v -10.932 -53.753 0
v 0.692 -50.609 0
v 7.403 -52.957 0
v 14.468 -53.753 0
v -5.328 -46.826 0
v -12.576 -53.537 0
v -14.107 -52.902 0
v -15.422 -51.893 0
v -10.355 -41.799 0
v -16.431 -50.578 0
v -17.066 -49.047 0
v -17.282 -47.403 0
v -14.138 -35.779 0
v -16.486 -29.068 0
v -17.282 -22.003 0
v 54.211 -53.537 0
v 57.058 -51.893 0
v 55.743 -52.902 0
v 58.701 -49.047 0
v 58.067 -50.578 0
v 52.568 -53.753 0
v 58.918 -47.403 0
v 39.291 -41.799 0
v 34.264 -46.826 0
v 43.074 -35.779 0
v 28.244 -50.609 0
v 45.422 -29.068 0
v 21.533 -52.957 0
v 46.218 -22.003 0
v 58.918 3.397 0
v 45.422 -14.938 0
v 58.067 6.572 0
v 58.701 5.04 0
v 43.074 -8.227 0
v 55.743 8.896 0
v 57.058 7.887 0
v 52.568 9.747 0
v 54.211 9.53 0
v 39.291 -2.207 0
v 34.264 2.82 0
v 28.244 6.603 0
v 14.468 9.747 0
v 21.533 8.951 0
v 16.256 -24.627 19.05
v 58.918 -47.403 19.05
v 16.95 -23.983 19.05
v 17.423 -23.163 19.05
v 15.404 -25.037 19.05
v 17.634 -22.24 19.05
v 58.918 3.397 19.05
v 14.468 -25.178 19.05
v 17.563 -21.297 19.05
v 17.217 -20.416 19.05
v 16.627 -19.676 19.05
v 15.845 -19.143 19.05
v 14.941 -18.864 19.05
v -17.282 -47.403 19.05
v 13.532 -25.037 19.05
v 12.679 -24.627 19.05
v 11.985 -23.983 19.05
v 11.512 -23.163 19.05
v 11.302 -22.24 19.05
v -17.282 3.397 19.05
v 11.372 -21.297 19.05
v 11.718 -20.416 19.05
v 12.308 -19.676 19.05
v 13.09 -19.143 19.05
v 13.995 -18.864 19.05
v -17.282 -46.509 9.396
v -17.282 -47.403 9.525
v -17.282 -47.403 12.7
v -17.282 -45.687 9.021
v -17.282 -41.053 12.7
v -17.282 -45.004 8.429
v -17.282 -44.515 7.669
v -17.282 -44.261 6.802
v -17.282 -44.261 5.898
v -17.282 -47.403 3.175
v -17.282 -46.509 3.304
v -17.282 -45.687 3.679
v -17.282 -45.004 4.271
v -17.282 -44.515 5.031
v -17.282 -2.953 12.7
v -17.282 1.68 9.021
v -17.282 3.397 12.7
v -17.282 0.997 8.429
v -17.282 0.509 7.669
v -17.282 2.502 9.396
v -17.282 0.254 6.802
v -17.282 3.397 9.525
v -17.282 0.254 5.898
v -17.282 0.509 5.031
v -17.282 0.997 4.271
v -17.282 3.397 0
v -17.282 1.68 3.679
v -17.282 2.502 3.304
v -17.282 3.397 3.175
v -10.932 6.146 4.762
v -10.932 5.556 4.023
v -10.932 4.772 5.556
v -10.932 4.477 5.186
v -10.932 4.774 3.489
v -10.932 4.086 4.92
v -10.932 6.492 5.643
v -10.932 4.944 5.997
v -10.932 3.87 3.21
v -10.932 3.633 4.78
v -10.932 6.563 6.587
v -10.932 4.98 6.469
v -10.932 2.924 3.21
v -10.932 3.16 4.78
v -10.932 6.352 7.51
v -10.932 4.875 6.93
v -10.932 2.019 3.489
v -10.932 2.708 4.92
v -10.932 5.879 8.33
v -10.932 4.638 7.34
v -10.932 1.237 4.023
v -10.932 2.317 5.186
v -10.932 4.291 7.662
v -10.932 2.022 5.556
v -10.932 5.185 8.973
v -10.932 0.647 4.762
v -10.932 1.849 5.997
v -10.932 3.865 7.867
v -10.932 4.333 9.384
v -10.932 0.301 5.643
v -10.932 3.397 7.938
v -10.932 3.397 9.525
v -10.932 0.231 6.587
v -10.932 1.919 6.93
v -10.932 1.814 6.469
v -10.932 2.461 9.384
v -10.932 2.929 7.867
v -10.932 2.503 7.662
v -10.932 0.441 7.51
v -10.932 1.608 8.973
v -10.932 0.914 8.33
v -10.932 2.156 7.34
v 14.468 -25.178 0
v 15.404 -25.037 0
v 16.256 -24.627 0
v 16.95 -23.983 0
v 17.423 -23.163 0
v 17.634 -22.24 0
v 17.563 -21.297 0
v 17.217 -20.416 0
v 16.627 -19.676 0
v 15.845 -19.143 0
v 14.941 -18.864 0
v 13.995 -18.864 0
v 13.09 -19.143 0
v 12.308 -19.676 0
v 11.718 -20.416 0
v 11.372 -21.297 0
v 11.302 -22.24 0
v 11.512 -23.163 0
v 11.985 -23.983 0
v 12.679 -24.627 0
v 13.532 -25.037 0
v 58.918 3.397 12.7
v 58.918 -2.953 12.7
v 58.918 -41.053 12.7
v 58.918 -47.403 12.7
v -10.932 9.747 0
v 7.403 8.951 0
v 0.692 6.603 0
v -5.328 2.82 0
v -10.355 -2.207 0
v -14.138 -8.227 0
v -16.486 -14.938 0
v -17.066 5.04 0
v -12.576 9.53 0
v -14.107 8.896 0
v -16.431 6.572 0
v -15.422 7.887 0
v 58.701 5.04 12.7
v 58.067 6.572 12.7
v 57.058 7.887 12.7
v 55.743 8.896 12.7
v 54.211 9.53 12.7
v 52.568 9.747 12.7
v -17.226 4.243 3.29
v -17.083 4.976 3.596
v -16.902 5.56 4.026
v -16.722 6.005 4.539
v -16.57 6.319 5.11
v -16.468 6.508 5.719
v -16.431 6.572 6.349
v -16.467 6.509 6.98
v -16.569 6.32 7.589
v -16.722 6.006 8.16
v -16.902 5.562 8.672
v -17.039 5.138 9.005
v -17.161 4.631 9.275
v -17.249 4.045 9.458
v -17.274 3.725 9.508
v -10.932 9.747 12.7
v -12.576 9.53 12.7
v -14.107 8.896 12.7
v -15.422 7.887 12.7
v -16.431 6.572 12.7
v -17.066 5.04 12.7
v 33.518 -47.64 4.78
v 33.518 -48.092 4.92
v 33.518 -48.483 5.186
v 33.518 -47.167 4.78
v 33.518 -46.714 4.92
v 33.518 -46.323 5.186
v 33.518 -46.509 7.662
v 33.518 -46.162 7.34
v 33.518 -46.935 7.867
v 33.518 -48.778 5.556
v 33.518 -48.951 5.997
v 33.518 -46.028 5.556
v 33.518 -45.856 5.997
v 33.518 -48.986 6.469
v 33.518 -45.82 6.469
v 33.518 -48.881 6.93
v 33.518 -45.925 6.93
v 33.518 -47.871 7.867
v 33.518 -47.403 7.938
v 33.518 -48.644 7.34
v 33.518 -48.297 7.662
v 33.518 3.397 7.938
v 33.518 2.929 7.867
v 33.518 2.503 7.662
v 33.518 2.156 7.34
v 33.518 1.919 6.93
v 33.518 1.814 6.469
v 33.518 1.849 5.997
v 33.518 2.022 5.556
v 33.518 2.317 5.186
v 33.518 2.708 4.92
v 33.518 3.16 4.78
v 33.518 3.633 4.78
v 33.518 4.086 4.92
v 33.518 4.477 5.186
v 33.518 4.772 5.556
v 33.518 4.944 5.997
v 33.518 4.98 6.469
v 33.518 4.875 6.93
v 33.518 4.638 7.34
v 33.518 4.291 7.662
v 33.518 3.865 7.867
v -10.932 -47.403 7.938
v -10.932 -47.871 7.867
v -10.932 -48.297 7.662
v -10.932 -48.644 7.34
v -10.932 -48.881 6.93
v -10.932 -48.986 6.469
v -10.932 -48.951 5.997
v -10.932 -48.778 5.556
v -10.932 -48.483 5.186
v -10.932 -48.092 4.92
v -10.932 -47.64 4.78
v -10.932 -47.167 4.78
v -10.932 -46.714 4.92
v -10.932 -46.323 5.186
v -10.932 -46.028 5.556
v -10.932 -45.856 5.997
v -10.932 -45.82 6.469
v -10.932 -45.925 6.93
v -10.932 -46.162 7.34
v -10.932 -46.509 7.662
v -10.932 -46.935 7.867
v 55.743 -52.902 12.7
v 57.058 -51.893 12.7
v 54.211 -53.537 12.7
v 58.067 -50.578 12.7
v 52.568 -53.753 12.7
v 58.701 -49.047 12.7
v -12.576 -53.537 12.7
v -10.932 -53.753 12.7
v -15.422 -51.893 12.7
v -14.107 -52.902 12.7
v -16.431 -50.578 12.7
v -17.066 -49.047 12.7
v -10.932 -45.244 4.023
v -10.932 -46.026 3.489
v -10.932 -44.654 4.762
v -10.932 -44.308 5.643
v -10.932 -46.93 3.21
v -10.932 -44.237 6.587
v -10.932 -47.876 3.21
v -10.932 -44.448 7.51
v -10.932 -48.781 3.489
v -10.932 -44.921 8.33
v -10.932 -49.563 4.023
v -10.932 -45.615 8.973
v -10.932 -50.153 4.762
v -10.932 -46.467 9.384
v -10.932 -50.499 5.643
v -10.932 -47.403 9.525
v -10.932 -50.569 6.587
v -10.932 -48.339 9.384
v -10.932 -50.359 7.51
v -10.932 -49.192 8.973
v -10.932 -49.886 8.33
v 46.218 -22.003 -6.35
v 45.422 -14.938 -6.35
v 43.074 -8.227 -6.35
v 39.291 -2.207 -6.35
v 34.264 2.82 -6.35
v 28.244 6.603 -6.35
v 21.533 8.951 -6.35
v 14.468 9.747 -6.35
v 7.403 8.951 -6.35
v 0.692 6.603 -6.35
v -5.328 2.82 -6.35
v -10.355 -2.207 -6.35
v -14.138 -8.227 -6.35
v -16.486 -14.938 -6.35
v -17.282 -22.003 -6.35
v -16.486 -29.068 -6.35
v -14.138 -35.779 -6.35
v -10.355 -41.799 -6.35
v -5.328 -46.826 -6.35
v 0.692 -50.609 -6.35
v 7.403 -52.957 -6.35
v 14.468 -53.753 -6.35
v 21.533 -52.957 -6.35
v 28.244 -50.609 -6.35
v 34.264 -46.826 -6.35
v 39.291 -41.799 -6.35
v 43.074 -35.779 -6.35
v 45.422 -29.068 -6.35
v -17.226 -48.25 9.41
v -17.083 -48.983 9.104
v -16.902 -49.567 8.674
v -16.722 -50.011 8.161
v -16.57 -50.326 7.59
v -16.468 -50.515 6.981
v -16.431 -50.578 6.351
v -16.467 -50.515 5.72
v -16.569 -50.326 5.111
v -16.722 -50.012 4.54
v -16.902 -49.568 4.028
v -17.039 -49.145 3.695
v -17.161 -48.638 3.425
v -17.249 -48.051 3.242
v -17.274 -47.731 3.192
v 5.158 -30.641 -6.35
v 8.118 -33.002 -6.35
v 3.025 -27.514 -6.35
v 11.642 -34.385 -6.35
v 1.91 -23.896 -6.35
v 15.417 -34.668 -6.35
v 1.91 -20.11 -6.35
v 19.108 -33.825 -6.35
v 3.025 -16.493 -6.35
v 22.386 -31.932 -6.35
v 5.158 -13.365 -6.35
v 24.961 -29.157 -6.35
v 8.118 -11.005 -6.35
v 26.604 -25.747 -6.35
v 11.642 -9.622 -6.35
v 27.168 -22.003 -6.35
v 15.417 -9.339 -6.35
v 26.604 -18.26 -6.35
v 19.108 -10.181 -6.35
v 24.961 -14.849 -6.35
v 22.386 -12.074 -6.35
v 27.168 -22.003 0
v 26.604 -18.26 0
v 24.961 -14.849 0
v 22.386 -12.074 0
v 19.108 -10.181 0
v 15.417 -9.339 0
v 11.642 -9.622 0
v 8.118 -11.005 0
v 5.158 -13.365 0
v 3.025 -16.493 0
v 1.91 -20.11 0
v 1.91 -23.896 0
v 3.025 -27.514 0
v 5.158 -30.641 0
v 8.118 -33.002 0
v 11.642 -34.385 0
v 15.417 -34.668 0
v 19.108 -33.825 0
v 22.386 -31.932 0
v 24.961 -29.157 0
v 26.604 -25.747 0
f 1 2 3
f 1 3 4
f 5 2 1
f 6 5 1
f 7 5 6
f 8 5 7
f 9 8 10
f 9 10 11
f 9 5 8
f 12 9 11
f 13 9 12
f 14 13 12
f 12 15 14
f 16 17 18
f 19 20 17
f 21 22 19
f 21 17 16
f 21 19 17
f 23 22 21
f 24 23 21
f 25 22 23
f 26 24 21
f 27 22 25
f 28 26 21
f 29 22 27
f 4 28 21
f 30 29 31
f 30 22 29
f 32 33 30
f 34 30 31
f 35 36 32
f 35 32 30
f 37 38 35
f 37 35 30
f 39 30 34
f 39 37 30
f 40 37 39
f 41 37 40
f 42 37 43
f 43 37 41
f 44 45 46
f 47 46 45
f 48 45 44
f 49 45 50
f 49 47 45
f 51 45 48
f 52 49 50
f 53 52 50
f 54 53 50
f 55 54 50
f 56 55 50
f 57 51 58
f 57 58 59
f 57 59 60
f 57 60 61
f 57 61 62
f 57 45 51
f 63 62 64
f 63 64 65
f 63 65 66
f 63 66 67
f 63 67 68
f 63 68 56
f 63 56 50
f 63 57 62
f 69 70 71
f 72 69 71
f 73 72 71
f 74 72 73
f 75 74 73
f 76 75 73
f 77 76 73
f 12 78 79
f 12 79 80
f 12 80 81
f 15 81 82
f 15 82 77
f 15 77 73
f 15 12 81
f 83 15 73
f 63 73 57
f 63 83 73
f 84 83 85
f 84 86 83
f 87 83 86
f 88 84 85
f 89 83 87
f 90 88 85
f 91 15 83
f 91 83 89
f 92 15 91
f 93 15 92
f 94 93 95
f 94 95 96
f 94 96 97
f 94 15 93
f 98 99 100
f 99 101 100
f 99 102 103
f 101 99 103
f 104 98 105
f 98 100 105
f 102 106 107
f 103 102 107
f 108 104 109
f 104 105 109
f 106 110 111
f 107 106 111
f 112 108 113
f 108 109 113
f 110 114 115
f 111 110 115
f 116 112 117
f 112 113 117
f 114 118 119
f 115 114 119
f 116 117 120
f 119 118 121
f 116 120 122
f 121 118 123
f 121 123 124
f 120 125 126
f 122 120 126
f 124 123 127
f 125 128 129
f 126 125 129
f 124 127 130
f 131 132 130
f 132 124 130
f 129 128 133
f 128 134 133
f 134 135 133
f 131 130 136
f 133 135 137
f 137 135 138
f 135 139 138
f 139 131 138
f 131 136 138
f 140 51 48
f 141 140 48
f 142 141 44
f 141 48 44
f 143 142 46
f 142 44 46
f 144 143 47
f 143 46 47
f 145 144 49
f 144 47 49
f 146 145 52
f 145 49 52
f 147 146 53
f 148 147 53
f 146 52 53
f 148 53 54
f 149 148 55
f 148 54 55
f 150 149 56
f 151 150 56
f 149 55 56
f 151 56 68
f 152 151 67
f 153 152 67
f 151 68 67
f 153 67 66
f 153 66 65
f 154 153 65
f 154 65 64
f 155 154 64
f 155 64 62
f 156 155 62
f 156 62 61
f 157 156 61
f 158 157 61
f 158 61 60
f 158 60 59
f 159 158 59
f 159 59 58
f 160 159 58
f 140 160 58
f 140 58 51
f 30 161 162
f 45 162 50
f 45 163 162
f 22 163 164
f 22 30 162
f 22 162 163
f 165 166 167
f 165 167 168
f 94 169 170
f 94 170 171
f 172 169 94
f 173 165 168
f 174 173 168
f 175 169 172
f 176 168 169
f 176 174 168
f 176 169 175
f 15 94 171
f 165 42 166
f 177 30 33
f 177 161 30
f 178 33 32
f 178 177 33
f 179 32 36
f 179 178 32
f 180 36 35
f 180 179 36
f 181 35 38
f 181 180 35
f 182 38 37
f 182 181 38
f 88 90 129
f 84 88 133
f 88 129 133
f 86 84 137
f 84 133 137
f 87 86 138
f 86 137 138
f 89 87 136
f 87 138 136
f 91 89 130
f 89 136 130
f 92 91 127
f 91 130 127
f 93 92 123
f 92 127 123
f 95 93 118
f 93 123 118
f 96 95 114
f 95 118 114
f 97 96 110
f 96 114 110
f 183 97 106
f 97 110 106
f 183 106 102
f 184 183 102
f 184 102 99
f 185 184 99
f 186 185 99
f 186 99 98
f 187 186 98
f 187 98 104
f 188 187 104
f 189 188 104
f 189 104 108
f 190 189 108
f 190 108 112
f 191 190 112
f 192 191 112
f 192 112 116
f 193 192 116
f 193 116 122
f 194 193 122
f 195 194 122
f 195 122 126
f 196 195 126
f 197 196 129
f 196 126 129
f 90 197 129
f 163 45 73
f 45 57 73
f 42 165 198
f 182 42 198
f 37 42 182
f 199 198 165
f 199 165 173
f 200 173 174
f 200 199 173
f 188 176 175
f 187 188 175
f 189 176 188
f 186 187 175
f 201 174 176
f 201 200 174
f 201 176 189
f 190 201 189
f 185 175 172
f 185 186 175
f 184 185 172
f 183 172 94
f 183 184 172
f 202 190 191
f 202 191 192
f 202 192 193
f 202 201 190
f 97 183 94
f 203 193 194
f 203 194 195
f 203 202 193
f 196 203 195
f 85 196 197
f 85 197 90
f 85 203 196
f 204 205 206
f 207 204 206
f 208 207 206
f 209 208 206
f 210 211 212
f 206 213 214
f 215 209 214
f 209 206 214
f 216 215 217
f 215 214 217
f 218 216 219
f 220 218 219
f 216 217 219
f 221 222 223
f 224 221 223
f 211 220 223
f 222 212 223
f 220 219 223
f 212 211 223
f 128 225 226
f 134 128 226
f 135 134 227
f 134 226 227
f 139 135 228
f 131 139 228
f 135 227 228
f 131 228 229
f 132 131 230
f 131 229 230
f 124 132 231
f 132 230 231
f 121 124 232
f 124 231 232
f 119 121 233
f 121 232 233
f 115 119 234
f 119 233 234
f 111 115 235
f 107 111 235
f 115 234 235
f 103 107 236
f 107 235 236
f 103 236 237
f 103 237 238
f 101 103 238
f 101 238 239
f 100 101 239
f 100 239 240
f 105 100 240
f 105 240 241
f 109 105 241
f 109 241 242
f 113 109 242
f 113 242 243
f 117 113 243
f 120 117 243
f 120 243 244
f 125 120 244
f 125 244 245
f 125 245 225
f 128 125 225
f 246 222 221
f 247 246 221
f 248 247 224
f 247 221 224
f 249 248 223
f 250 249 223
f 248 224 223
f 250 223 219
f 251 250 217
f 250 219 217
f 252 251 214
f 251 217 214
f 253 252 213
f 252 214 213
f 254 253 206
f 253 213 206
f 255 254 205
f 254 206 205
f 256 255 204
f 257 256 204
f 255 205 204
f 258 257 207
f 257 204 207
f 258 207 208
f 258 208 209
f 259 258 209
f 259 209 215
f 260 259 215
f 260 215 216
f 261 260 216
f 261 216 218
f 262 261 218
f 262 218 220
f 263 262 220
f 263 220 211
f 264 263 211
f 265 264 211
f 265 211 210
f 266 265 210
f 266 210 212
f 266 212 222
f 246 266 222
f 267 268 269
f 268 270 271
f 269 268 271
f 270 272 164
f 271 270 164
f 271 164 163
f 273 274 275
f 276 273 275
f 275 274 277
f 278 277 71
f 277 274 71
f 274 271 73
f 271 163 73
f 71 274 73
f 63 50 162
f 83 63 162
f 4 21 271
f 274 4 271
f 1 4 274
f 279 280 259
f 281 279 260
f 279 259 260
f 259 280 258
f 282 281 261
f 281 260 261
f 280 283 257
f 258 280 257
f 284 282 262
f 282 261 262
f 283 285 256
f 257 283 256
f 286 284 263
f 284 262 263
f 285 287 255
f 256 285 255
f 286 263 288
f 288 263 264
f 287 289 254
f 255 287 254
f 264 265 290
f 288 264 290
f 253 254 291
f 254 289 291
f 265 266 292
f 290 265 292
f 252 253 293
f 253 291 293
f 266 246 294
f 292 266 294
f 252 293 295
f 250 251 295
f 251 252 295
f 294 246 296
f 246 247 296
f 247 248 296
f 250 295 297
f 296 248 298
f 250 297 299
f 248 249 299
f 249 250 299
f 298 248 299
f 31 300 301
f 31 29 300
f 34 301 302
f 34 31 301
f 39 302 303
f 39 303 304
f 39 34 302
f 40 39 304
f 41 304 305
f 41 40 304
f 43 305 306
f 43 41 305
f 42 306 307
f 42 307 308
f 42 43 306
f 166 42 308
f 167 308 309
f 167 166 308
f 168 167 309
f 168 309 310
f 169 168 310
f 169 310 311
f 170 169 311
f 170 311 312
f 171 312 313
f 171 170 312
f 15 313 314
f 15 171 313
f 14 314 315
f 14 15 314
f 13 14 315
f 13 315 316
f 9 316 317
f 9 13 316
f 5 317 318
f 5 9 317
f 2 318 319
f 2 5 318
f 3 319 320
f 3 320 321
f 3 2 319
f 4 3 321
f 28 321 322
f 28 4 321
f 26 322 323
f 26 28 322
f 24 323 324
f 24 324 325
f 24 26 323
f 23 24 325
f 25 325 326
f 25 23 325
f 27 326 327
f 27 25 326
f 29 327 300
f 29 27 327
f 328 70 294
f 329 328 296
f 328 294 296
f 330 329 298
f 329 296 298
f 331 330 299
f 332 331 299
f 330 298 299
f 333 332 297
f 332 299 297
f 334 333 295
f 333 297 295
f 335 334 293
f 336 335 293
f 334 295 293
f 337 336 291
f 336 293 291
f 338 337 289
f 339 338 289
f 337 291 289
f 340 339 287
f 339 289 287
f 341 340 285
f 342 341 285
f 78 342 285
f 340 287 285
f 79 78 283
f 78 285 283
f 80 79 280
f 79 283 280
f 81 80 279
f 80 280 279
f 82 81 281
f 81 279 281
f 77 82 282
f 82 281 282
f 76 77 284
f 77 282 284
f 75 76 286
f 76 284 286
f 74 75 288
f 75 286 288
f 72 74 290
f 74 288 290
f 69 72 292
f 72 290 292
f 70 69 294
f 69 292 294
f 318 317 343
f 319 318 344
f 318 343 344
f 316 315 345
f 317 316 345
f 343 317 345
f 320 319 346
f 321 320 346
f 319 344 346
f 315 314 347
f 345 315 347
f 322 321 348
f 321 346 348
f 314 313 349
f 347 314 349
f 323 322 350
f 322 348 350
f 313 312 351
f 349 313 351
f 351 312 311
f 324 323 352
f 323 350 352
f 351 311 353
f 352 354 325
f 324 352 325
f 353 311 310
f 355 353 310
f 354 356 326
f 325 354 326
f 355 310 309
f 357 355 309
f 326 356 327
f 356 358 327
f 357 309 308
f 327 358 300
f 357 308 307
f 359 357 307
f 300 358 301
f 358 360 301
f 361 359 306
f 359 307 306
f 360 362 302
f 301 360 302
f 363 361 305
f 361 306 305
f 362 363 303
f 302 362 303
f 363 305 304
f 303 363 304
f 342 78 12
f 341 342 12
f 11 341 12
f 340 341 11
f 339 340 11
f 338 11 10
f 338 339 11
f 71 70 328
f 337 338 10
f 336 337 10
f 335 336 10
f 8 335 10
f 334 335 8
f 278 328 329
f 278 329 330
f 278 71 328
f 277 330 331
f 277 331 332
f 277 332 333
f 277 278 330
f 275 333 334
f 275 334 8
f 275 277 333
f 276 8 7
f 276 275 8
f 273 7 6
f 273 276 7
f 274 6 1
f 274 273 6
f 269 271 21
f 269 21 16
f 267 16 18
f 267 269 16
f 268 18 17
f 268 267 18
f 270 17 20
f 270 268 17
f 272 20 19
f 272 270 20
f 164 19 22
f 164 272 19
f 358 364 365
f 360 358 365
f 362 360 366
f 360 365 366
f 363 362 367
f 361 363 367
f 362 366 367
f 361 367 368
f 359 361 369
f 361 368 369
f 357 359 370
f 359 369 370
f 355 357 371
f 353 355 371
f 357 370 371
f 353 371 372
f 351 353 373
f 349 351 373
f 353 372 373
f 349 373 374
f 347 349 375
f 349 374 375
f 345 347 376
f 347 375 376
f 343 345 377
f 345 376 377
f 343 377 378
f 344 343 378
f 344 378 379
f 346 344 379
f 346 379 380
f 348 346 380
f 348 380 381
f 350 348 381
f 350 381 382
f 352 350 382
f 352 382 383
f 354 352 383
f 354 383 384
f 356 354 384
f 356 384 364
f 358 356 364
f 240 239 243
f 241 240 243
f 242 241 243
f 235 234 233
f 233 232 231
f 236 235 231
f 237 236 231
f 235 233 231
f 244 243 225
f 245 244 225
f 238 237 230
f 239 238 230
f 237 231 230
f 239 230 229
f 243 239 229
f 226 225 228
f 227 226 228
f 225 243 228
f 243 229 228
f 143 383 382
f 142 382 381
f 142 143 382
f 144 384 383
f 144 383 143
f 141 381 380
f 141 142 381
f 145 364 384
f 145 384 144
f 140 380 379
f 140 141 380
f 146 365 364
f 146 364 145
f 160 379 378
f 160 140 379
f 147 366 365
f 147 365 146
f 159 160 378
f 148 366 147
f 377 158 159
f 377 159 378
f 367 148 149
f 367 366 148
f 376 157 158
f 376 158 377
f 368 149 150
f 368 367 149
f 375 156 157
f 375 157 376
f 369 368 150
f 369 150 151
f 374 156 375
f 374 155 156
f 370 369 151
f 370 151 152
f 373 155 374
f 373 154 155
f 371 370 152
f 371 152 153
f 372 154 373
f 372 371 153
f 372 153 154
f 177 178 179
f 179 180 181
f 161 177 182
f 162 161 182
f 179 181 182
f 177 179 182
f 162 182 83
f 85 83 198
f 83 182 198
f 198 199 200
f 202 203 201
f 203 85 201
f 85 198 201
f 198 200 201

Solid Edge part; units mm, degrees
sketch "Sketch1" plane through (0, 0, 0) normal (0, 0, 1) x (1, 0, 0)
  circle A0 centre (14.4678, -22.0032) radius 31.75
  circle A1 centre (14.4678, -22.0032) radius 12.7
extrude "Protrusion1" add sketch "Sketch1" against normal blind 6.35
sketch "Sketch2" plane through (0, 0, 0) normal (0, 0, 1) x (1, 0, 0)
  line L0 (58.9178, -53.7532) -> (-17.2822, -53.7532)
  line L1 (-17.2822, -53.7532) -> (-17.2822, 9.7468)
  line L2 (-17.2822, 9.7468) -> (58.9178, 9.7468)
  line L3 (58.9178, 9.7468) -> (58.9178, -53.7532)
extrude "ExtrudedProtrusion_2" add sketch "Sketch2" along normal blind 12.7
sketch "Sketch3" plane through (-17.2822, -22.0032, 6.35) normal (-1, 0, 0) x (0, -1, 0)
  line L0 (25.4, 12.7) -> (-25.4, 12.7)
  line L1 (-25.4, 12.7) -> (-19.05, 6.35)
  line L2 (19.05, 6.35) -> (-19.05, 6.35)
  line L3 (25.4, 12.7) -> (19.05, 6.35)
extrude "ExtrudedProtrusion_3" add sketch "Sketch3" against normal blind 76.2
hole "Hole_1" at (14.4678, -22.0032, 19.05) direction (0, 0, -1) diameter 6.35 end up to next
fillet "Round_1" radius 6.35 4 edges at (-17.2822, -53.7532, 6.35) (-17.2822, 9.7468, 6.35) (58.9178, -53.7532, 6.35) (58.9178, 9.7468, 6.35)
hole "Hole_2" at (-17.2822, 3.3968, 6.35) direction (1, 0, 0) diameter 3.175 depth 50.8 counterbore diameter 6.35 counterbore depth 6.35
hole "Hole1" at (-17.2822, -47.4032, 6.35) direction (1, 0, 0) diameter 3.175 depth 50.8 counterbore diameter 6.35 counterbore depth 6.35
